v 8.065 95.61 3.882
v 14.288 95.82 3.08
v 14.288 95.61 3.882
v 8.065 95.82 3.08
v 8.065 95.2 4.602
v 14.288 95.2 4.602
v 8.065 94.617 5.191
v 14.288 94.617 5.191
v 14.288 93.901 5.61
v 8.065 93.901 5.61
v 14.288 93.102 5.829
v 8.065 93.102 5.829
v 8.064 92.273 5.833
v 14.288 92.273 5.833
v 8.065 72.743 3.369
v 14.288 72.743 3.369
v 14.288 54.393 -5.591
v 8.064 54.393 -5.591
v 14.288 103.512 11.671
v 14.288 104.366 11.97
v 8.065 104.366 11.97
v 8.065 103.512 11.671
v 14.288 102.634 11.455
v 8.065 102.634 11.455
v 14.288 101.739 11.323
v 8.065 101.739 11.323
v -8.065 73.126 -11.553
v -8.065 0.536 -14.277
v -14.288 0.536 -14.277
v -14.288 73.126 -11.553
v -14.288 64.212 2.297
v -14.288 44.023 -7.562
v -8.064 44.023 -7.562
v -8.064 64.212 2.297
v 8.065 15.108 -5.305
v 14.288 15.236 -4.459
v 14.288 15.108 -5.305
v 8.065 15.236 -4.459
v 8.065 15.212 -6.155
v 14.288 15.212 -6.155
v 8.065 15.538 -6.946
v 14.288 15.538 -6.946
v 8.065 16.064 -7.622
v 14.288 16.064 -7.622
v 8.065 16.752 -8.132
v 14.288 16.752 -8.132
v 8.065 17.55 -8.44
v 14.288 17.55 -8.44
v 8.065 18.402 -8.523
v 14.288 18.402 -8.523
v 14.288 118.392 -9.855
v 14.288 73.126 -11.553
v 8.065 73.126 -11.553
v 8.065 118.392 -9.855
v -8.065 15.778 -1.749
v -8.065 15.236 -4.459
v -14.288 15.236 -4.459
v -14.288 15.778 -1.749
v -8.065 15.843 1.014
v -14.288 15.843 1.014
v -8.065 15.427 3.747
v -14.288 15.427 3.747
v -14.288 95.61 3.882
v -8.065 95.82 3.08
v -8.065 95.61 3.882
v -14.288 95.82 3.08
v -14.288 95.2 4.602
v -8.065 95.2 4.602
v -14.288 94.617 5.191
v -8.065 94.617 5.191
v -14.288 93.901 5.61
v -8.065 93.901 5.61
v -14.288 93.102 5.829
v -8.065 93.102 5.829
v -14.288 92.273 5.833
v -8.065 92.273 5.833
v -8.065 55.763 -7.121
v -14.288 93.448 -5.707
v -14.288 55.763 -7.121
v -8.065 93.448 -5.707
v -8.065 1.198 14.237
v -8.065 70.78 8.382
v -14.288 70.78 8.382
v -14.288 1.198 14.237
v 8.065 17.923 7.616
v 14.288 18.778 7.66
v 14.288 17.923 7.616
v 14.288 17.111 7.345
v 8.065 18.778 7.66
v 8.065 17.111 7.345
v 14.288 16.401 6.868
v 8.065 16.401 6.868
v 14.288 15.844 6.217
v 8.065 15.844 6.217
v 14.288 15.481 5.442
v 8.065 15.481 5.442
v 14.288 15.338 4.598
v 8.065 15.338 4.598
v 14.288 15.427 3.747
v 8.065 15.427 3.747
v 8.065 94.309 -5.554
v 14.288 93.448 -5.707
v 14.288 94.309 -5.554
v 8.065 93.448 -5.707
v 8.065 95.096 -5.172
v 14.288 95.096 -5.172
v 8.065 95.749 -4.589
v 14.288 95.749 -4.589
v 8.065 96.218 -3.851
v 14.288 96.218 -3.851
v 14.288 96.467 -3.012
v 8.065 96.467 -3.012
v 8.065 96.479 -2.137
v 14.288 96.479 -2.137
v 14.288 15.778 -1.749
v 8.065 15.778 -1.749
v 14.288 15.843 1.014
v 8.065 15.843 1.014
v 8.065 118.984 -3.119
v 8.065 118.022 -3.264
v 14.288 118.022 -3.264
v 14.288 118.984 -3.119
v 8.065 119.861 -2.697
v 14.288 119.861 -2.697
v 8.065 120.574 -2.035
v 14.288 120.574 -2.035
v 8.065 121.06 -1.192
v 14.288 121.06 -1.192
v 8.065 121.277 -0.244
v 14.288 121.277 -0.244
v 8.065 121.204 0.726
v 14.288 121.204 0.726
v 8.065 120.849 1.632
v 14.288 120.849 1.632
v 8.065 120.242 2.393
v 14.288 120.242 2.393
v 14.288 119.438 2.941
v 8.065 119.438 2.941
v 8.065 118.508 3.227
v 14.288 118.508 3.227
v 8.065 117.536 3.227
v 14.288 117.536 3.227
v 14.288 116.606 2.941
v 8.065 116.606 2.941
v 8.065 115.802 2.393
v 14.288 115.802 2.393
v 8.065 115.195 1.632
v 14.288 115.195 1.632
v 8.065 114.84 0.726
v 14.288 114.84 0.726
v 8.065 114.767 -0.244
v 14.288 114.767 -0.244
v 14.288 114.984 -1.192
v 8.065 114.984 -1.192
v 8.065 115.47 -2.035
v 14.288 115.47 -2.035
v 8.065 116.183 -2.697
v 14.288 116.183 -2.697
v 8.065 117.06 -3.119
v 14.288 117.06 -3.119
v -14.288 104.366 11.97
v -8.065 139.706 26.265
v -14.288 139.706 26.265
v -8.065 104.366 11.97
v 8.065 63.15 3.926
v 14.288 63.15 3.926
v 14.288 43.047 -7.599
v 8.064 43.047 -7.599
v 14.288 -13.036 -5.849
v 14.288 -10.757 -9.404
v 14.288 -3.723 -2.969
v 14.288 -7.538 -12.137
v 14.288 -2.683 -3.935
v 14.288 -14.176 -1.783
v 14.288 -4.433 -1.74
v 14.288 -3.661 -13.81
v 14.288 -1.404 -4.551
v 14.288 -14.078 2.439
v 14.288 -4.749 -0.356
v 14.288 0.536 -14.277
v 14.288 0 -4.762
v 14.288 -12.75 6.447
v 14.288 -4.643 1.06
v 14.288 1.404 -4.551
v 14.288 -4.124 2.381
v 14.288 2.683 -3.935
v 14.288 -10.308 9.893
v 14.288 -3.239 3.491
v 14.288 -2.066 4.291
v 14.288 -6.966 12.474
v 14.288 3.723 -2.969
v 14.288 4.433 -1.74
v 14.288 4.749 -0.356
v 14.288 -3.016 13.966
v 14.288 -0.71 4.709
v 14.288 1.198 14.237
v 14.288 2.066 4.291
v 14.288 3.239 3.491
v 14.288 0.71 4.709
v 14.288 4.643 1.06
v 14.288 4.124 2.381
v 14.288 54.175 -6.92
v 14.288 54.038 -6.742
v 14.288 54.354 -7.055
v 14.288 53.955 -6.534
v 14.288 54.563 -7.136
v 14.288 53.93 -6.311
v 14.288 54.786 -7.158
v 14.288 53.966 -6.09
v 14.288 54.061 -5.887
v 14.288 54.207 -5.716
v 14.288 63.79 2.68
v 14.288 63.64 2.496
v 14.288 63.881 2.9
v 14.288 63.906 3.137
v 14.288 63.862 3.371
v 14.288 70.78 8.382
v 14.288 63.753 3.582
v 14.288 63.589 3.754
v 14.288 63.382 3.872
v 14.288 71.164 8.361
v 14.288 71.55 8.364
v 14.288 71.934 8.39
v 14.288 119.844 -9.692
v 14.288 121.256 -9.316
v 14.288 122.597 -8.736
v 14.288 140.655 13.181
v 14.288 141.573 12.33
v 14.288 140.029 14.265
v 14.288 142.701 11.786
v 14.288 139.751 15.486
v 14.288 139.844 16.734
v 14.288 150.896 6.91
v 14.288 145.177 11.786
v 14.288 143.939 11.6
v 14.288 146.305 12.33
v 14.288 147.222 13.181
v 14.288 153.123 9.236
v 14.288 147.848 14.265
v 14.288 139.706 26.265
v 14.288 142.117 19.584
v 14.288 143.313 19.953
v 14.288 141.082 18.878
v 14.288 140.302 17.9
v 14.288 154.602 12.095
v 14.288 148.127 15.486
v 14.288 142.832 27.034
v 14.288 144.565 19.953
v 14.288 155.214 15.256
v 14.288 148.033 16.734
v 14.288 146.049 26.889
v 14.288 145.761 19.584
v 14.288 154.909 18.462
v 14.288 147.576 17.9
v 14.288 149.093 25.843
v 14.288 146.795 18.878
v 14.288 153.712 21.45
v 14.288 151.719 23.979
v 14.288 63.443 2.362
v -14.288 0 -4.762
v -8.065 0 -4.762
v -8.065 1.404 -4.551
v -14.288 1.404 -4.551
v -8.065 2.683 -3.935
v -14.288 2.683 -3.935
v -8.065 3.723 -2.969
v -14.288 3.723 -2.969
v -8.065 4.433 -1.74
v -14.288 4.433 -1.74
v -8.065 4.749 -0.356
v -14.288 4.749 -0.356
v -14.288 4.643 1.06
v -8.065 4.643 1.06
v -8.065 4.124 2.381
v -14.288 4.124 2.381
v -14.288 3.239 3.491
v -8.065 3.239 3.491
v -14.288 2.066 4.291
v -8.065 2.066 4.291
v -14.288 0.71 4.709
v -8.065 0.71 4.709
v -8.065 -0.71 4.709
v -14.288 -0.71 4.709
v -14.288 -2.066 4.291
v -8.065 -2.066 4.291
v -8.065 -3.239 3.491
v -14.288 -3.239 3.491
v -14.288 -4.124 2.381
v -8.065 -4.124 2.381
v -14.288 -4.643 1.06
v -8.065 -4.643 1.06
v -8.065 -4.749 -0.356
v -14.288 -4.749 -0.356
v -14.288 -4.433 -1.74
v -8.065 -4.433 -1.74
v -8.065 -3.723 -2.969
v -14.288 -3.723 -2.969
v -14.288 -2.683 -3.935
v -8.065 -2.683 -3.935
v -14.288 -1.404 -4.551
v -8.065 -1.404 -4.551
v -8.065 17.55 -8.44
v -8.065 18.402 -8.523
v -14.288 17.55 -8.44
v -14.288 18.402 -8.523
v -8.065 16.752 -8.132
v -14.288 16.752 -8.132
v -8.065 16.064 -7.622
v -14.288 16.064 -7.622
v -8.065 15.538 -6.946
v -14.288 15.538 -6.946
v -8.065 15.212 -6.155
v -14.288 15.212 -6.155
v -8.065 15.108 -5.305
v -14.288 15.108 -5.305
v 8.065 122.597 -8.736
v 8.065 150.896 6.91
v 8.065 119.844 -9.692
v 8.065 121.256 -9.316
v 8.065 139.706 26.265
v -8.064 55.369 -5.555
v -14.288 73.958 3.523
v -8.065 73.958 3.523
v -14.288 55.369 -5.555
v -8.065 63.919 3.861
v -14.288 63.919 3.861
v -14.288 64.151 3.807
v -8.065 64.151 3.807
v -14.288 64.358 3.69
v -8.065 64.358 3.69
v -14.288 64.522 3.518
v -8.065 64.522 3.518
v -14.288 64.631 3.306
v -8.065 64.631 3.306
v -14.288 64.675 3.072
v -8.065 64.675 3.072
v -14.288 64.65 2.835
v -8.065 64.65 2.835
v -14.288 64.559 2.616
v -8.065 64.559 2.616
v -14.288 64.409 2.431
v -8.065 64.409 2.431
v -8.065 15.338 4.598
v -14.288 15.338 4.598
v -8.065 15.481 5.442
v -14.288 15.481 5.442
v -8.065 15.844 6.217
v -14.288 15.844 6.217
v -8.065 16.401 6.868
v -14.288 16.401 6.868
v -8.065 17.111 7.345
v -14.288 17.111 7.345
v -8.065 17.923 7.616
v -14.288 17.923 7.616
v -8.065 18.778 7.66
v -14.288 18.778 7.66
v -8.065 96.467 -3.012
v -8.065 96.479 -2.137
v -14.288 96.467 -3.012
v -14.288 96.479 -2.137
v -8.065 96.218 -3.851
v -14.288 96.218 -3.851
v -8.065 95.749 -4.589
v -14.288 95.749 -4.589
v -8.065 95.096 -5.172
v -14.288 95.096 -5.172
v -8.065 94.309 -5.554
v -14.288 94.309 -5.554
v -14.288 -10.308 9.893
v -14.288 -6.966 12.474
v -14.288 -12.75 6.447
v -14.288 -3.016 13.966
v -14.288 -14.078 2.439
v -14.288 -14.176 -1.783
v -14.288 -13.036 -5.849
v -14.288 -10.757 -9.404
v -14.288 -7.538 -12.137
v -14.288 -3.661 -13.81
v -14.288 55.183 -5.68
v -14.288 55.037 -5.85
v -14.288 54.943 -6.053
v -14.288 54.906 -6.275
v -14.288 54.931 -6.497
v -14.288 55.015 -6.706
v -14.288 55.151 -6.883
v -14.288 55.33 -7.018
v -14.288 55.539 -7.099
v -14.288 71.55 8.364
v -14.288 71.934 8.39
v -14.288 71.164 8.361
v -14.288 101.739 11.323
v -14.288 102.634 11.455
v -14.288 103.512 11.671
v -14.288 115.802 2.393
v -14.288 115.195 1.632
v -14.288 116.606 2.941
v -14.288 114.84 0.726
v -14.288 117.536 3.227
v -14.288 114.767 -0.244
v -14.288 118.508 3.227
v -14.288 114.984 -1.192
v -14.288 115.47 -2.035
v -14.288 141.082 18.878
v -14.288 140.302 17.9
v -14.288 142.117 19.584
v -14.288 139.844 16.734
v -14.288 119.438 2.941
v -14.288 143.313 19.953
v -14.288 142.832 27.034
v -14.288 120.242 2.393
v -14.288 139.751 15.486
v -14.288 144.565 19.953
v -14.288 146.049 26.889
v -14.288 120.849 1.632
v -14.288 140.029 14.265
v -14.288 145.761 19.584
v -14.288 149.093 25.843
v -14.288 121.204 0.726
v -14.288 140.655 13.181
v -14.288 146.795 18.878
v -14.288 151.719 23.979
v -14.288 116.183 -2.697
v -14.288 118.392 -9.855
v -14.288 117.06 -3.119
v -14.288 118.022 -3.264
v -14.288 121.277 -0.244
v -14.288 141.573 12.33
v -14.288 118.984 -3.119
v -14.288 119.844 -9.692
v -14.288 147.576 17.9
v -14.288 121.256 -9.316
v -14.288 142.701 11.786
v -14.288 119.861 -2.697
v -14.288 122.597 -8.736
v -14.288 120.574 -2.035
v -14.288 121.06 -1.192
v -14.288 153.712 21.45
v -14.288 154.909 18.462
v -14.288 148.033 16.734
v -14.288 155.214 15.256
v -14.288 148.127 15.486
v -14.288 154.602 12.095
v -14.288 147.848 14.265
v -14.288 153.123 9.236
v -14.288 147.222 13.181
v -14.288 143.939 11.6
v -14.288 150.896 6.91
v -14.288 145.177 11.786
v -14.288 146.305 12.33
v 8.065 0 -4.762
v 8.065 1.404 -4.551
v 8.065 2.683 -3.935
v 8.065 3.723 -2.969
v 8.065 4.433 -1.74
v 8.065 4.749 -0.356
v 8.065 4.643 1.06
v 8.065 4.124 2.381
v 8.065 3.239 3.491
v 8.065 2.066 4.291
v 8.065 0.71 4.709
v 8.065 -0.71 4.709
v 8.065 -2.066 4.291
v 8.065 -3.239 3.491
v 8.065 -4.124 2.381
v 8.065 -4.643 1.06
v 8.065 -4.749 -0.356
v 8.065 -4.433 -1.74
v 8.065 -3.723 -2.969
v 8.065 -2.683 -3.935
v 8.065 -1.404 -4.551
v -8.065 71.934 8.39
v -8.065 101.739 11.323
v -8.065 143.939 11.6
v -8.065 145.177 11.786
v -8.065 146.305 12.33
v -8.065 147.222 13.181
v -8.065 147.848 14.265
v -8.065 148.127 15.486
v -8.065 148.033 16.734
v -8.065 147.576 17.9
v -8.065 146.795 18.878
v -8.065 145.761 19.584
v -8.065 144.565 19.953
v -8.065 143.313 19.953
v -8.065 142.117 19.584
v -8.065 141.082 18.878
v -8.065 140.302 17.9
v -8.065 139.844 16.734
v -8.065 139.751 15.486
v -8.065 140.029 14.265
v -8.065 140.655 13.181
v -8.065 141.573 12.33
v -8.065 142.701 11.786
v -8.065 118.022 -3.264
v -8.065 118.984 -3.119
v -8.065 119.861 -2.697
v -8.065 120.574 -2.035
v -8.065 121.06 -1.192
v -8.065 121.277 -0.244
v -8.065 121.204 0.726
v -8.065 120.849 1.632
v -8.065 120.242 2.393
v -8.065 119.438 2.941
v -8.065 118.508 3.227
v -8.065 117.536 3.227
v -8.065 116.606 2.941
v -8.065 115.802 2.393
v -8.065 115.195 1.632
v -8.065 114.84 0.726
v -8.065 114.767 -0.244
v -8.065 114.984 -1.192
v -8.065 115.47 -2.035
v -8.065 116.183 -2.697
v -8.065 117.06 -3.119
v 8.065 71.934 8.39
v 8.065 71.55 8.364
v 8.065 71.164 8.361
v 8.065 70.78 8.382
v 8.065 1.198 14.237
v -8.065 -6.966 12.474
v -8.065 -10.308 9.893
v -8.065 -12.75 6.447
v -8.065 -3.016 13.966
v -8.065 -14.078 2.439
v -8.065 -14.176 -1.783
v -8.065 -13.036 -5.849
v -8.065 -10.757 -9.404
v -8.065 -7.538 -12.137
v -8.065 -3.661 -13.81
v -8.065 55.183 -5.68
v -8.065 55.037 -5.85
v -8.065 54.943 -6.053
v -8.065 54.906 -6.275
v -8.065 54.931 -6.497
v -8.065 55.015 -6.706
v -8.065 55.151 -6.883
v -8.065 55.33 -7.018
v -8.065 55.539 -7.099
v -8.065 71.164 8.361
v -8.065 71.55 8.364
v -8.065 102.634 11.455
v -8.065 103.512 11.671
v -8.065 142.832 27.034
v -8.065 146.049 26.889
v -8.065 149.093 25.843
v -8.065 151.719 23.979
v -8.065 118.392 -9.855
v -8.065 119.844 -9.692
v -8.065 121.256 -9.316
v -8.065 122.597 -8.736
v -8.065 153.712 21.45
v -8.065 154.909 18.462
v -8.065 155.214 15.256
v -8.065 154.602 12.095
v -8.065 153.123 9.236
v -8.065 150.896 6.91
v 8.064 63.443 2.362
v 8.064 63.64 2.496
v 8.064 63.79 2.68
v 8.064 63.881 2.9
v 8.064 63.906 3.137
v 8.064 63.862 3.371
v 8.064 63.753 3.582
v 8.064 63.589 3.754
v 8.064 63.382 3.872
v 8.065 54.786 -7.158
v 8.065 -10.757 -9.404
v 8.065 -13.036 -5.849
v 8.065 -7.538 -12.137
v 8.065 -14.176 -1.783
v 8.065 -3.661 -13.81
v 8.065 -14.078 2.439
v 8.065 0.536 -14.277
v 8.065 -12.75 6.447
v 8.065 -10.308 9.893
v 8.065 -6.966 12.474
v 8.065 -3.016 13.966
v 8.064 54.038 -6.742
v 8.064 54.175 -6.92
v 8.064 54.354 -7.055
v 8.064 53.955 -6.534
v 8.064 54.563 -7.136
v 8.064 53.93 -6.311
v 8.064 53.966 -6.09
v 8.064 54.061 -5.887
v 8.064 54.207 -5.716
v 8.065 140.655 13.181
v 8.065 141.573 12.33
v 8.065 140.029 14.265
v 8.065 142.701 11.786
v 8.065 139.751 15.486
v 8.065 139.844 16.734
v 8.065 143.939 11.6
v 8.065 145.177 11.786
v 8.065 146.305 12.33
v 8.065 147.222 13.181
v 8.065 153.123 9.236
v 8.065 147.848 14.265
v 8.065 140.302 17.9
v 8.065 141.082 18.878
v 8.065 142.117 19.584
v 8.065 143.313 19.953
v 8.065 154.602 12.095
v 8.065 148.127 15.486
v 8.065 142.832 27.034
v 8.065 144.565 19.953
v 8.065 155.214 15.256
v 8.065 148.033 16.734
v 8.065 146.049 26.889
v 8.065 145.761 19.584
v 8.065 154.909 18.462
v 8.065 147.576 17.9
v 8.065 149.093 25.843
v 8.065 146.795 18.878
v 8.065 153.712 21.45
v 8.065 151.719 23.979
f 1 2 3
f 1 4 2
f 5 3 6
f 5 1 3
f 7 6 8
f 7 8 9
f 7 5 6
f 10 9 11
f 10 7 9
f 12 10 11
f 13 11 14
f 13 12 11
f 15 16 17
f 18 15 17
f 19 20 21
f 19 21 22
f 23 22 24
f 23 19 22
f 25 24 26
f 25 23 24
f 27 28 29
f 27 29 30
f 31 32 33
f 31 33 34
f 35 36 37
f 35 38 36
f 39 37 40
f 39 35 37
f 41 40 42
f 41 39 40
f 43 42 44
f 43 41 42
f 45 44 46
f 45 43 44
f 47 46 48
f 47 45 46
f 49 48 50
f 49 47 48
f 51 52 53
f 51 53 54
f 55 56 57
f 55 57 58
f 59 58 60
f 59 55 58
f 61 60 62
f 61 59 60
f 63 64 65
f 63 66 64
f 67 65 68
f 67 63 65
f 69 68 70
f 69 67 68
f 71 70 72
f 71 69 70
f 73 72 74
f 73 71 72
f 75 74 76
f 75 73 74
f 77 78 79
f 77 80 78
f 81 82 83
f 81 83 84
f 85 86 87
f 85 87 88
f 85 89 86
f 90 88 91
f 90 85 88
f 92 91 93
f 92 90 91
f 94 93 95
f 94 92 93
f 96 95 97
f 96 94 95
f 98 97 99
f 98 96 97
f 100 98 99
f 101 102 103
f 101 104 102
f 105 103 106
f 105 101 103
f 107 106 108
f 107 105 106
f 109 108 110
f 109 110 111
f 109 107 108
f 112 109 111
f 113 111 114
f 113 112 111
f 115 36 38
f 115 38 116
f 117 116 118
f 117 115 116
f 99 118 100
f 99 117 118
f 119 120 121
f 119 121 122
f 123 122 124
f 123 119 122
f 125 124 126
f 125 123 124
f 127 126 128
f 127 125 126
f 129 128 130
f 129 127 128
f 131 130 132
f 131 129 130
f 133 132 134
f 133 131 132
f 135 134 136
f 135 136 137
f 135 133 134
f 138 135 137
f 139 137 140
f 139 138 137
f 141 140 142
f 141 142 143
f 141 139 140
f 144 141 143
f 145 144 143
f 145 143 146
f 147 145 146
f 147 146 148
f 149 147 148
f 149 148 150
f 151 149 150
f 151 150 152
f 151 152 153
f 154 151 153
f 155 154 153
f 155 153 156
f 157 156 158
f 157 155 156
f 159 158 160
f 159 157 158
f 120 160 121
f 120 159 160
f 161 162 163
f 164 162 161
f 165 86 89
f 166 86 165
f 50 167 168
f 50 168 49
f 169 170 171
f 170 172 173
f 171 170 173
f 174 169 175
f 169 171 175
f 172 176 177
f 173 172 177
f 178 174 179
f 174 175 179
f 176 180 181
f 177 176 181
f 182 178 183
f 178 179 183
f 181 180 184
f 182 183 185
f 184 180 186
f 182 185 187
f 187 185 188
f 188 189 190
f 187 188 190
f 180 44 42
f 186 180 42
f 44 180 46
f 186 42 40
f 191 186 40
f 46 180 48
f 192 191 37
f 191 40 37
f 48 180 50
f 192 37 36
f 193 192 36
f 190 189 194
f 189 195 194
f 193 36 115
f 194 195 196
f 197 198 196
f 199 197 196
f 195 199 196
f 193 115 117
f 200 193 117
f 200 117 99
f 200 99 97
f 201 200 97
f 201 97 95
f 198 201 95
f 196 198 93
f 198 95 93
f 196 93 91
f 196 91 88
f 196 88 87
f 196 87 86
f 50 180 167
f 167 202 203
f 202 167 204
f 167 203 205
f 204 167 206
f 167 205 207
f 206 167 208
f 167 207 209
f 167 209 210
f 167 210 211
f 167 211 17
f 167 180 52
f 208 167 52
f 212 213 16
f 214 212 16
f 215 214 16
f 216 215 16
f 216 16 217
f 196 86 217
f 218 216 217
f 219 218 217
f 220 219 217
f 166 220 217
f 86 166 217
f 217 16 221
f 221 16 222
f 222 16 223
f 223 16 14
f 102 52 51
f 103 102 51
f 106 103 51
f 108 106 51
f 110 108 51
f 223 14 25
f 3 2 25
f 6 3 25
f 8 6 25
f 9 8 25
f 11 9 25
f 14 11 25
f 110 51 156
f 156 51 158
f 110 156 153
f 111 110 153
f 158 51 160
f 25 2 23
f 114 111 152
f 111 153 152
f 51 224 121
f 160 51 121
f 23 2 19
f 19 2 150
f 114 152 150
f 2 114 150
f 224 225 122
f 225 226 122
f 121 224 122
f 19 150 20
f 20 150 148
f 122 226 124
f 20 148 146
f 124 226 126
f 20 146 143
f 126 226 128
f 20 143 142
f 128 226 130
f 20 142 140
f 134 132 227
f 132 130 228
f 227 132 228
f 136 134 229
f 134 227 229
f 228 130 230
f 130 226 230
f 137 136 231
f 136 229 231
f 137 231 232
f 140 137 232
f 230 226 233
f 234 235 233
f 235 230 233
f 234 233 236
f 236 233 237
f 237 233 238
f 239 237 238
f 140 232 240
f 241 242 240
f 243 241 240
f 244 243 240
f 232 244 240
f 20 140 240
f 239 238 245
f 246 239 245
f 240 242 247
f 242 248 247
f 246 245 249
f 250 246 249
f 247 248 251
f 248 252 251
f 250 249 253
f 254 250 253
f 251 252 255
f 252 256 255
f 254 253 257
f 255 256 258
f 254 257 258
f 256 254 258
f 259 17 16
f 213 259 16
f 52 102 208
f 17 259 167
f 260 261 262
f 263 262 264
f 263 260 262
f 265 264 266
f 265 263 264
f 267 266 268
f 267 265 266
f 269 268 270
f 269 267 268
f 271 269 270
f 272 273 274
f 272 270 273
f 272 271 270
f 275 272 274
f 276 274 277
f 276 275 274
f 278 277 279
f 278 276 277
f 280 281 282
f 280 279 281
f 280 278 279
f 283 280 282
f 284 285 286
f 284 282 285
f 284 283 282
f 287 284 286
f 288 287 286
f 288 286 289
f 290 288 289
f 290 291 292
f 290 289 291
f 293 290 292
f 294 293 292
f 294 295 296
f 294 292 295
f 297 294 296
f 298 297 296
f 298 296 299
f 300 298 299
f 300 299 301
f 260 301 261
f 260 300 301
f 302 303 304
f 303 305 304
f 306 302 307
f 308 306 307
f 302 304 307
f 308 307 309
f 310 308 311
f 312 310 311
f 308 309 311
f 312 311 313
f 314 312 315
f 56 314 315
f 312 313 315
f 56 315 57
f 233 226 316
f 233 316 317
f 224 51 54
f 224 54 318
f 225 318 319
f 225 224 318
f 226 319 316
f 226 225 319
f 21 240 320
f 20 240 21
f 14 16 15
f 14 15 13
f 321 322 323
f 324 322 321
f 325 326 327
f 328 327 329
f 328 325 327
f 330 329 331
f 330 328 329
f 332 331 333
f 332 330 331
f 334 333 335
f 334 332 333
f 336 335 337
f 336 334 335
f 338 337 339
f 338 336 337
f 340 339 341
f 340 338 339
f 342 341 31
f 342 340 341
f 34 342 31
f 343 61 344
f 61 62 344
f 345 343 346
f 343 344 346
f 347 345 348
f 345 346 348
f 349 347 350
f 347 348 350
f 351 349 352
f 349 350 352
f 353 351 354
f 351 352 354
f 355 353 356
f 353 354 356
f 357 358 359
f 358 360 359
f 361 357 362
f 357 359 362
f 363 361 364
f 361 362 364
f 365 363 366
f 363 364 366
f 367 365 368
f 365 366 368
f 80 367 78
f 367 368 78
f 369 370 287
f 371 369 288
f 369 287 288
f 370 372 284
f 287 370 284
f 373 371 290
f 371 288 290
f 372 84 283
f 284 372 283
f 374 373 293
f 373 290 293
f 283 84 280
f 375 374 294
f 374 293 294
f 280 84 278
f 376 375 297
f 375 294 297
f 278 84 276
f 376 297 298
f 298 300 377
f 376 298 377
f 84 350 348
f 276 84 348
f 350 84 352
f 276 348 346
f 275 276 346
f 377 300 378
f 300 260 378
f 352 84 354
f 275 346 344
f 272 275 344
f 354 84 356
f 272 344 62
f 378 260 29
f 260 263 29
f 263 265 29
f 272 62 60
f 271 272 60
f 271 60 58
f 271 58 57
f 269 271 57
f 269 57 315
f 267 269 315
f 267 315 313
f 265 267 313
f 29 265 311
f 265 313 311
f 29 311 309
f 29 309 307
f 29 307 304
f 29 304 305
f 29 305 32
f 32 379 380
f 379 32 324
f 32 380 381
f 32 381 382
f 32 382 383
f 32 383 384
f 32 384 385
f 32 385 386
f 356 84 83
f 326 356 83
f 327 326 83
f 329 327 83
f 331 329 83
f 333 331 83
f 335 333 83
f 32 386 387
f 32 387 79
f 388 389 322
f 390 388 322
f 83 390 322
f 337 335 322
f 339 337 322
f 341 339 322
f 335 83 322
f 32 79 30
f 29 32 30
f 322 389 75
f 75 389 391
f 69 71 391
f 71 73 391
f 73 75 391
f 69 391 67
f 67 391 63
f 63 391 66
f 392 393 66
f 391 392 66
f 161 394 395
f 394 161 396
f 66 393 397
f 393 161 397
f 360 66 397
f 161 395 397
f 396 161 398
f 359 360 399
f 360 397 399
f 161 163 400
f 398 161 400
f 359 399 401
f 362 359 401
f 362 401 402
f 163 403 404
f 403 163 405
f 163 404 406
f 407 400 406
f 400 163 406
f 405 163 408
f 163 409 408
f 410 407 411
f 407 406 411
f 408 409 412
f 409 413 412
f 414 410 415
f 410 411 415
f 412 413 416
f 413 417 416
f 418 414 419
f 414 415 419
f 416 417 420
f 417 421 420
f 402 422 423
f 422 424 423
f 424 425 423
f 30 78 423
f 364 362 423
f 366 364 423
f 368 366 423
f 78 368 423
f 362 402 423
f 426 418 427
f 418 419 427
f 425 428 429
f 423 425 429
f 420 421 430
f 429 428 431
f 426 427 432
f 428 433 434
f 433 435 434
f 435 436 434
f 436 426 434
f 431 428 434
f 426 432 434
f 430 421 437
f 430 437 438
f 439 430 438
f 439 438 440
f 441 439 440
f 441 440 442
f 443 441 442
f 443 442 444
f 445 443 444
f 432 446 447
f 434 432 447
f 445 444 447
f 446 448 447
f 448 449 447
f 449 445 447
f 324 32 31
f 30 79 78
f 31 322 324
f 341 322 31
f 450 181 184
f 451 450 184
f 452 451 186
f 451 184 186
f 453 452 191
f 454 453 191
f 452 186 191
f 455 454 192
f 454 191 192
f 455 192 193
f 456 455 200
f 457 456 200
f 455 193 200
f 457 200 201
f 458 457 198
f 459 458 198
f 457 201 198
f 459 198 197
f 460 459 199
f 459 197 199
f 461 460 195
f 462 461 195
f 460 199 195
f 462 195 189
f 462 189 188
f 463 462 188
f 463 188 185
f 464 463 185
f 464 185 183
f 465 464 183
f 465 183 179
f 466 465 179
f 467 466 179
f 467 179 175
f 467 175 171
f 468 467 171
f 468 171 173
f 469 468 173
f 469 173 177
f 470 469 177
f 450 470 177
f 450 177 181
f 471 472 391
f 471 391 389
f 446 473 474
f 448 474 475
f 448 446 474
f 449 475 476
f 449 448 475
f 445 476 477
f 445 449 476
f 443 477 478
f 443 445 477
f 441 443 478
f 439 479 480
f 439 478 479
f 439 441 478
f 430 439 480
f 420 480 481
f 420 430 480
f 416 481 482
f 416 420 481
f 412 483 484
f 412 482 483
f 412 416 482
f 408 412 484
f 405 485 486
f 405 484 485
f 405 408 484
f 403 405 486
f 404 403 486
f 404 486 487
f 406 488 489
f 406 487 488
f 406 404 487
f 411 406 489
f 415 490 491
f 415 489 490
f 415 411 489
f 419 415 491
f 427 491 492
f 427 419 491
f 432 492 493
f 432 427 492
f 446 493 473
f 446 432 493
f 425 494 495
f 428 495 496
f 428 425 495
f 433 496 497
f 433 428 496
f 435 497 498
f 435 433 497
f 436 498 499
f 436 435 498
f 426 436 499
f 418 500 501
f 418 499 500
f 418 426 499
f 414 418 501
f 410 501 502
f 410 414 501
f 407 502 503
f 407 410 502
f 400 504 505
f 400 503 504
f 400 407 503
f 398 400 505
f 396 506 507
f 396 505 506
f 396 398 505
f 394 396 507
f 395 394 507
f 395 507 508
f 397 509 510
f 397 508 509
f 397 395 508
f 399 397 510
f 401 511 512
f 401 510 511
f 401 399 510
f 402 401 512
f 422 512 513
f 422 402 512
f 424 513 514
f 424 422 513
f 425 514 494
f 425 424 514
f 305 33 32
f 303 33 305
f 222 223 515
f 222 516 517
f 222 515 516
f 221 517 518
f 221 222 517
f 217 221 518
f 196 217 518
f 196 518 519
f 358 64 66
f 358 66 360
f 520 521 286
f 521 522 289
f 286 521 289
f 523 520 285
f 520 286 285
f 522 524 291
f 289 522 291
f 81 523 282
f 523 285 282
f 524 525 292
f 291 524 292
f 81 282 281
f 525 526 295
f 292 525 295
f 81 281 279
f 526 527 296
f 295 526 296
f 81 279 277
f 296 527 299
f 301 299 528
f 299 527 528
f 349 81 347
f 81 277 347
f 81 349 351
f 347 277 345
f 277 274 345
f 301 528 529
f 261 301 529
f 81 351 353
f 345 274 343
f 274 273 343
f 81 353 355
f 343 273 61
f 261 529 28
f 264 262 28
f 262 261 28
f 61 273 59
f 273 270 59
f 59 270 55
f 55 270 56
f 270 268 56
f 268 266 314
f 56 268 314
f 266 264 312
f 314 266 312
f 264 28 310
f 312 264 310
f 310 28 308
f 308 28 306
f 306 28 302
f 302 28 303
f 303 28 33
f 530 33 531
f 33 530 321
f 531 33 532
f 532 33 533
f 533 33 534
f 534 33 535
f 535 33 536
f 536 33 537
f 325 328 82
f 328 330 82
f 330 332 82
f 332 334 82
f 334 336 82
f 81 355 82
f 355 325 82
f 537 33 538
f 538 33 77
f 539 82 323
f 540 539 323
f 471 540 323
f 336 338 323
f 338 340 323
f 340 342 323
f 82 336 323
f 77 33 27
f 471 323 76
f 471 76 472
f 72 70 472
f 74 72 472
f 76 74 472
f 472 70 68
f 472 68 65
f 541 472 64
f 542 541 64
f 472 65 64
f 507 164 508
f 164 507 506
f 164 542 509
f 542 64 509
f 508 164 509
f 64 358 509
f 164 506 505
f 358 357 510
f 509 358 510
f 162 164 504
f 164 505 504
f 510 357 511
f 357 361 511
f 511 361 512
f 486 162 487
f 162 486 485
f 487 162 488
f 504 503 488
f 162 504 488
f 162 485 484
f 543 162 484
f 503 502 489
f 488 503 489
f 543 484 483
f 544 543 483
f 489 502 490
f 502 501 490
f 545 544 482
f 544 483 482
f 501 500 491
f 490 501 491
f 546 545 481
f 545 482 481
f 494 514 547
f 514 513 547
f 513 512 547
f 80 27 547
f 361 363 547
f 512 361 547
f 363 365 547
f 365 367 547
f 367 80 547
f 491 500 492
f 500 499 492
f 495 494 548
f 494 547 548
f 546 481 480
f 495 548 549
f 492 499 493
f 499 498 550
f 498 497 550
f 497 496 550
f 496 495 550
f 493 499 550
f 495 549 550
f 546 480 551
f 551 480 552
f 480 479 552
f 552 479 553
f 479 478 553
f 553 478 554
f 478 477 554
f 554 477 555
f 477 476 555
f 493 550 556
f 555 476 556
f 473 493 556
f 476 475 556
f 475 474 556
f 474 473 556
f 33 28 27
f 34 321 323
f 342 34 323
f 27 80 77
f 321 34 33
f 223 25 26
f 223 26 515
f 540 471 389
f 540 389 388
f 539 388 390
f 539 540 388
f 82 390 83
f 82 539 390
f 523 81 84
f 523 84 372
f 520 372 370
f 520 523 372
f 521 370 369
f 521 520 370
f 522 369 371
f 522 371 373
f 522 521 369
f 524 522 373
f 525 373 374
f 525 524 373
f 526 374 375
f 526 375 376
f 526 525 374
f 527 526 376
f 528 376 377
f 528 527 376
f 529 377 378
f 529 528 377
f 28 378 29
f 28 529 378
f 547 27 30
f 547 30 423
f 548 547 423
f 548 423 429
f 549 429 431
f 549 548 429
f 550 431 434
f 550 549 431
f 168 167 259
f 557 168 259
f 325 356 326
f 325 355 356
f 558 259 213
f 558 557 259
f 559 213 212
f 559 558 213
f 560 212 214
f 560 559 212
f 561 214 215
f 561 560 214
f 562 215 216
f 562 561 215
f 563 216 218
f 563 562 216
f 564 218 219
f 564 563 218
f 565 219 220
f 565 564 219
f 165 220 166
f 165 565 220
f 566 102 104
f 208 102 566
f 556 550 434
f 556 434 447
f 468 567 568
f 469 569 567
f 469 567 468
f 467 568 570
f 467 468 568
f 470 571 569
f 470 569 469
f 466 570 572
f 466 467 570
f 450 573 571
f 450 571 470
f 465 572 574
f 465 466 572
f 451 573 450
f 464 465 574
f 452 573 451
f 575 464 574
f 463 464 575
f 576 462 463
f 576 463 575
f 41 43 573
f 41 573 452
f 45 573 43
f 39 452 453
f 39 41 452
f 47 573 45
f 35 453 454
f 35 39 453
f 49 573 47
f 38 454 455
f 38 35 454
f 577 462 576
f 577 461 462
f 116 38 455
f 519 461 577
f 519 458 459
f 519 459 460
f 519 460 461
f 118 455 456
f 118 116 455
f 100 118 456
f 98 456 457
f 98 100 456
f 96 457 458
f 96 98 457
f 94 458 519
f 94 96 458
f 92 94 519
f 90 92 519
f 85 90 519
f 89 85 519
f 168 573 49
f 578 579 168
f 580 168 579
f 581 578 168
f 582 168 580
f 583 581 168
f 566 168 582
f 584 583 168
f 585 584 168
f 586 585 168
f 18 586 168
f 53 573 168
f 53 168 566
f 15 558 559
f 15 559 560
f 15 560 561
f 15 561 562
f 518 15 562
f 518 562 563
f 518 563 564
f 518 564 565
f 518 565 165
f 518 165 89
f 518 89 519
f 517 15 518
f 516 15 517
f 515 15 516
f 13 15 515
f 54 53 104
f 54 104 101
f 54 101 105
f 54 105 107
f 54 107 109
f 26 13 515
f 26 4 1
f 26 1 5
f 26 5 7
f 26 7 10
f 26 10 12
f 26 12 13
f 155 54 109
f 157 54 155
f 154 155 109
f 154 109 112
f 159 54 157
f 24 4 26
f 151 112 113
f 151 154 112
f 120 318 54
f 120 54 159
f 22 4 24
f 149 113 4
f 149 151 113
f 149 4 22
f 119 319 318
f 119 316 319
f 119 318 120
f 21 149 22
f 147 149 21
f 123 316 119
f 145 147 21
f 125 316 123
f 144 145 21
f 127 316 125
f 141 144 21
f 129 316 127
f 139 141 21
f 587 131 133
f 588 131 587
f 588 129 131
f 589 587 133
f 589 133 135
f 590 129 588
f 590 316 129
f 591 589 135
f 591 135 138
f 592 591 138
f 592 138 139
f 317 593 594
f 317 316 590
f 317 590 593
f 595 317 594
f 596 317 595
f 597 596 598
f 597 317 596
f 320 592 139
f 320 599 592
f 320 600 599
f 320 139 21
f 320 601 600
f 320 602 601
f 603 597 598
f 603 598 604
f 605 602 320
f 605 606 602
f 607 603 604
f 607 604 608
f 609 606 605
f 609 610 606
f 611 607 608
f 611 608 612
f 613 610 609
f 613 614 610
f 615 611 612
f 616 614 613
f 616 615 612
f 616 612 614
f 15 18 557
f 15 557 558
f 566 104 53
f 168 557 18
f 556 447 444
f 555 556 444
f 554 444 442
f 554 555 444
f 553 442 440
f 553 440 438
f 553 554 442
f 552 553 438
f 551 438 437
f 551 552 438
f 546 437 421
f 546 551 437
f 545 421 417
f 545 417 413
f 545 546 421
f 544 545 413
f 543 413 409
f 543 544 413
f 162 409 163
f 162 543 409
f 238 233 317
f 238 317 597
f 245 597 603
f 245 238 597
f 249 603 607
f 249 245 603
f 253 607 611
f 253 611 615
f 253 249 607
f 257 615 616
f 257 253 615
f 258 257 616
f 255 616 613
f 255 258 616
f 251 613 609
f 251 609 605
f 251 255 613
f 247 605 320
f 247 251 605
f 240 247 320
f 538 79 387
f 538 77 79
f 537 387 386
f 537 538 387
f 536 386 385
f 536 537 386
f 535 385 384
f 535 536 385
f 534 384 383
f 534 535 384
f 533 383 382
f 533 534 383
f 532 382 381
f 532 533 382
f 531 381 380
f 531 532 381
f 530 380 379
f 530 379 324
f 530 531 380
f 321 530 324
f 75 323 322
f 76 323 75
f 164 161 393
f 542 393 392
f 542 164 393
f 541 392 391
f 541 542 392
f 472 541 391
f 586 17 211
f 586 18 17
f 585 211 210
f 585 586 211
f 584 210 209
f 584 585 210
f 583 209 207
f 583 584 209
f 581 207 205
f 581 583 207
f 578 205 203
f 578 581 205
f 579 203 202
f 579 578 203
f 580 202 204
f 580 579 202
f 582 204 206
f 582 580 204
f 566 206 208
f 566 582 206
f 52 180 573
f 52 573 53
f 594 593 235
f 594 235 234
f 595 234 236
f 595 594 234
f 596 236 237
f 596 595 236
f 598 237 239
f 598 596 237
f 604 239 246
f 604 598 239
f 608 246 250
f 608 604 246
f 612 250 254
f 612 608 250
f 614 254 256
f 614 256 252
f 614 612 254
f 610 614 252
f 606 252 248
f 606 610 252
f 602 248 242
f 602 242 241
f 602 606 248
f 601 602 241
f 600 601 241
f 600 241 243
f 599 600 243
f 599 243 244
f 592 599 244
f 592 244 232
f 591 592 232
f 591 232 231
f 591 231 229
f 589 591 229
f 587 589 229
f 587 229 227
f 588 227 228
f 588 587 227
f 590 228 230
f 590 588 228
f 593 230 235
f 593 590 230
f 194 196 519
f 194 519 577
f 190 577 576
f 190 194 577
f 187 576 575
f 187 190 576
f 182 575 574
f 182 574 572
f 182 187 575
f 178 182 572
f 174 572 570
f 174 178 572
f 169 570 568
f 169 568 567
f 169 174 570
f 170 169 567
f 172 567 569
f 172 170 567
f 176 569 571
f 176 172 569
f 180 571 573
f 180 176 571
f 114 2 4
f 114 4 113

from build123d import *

# Parameters (mm, degrees)
SKETCH6_R           = 3.2639
SKETCH6_R_2         = 4.19989
BOSS_EXTRUDE3_DEPTH = 14.2875
SKETCH7_R           = 4.7625
CUT_EXTRUDE1_DEPTH  = 7.14375
SKETCH8_R           = 7.9375
CUT_EXTRUDE2_DEPTH  = 5.55625
CUT_EXTRUDE3_DEPTH  = 29.21
CUT_EXTRUDE5_DEPTH  = 28.575
FILLET2_R           = 3.175
FILLET3_R           = 3.175
BOSS_EXTRUDE4_DEPTH = 6.223
FILLET4_R           = 0.8255
BOSS_EXTRUDE5_DEPTH = 6.223
FILLET6_R           = 0.8255


with BuildPart() as part:
    # Sketch6 → Boss-Extrude3 (new body, symmetric)
    with BuildSketch(Plane(origin=(0, 0, 0), x_dir=(0, 0, -1), z_dir=(1, 0, 0))):
        with BuildLine():
            Line((-8.381868112, 70.779690611), (-14.237180291, 1.198062439))
            ThreePointArc((-14.237180291, 1.198062439), (-0.331752192, -14.283647879), (14.277450567, 0.53578125))
            Line((14.277450567, 0.53578125), (11.553393182, 73.126217476))
            Line((11.553393182, 73.126217476), (9.854739755, 118.39178125))
            ThreePointArc((9.854739755, 118.39178125), (9.530289118, 120.556972634), (8.73611616, 122.597220477))
            Line((8.73611616, 122.597220477), (-6.910022509, 150.896463863))
            ThreePointArc((-6.910022509, 150.896463863), (-21.450180104, 153.711509321), (-26.264611031, 139.705727705))
            Line((-26.264611031, 139.705727705), (-11.969665934, 104.365862186))
            ThreePointArc((-11.969665934, 104.365862186), (-11.552306922, 103.075438538), (-11.323296274, 101.738675336))
            Line((-11.323296274, 101.738675336), (-8.390034626, 71.934102831))
            ThreePointArc((-8.390034626, 71.934102831), (-8.359662681, 71.357082692), (-8.381868112, 70.779690611))
        make_face()
        with Locations((0, 118.021968393)):
            Circle(SKETCH6_R, mode=Mode.SUBTRACT)
        with Locations((-15.799642553, 143.938798421)):
            Circle(SKETCH6_R_2, mode=Mode.SUBTRACT)
    extrude(amount=BOSS_EXTRUDE3_DEPTH, both=True)

    # Sketch7 → Cut-Extrude1 (cut)
    with BuildSketch(Plane(origin=(14.2875, 0, 0), x_dir=(0, 0, -1), z_dir=(1, 0, 0))):
        Circle(SKETCH7_R)
    cut_extrude1 = extrude(amount=-CUT_EXTRUDE1_DEPTH, mode=Mode.SUBTRACT)

    # Sketch8 → Cut-Extrude2 (cut)
    with BuildSketch(Plane(origin=(7.14375, 0, 0), x_dir=(0, 0, -1), z_dir=(1, 0, 0))):
        Circle(SKETCH8_R)
    cut_extrude2 = extrude(amount=-CUT_EXTRUDE2_DEPTH, mode=Mode.SUBTRACT)

    # Mirror1: Cut-Extrude2 across plane
    add(cut_extrude2.mirror(Plane(origin=(0, 0, 0), x_dir=(0, 0, 1), z_dir=(1, 0, 0))), mode=Mode.SUBTRACT)

    # Mirror2: Cut-Extrude1 across plane
    add(cut_extrude1.mirror(Plane(origin=(0, 0, 0), x_dir=(0, 0, 1), z_dir=(1, 0, 0))), mode=Mode.SUBTRACT)

    # Sketch10 → Cut-Extrude3 (cut, symmetric)
    with BuildSketch(Plane(origin=(0, 0, 14.237180291), x_dir=(-1, 0, 0), z_dir=(0, 0, -1))):
        with BuildLine():
            Line((-8.0645, 155.976463863), (-8.0645, -18.648536137))
            ThreePointArc((-8.0645, -18.648536137), (-7.13456403, -20.893600167), (-4.8895, -21.823536137))
            Line((-4.8895, -21.823536137), (4.8895, -21.823536137))
            ThreePointArc((4.8895, -21.823536137), (7.13456403, -20.893600167), (8.0645, -18.648536137))
            Line((8.0645, -18.648536137), (8.0645, 155.976463863))
            Line((8.0645, 155.976463863), (-8.0645, 155.976463863))
        make_face()
    extrude(amount=CUT_EXTRUDE3_DEPTH, both=True, mode=Mode.SUBTRACT)

    # Sketch13 → Cut-Extrude5 (cut)
    with BuildSketch(Plane(origin=(14.2875, 0, 0), x_dir=(0, 0, -1), z_dir=(1, 0, 0))):
        with BuildLine():
            Line((-3.369379853, 72.742718267), (-6.230490775, 95.422966156))
            Line((-6.230490775, 95.422966156), (5.577203891, 96.912505615))
            Line((5.577203891, 96.912505615), (8.716072329, 13.26822174))
            ThreePointArc((8.716072329, 13.26822174), (0.368613547, 15.870719866), (-8.090670188, 13.658575362))
            Line((-8.090670188, 13.658575362), (-3.319759564, 70.353712855))
            ThreePointArc((-3.319759564, 70.353712855), (-3.281968474, 71.549515806), (-3.369379853, 72.742718267))
        make_face()
    extrude(amount=-CUT_EXTRUDE5_DEPTH, mode=Mode.SUBTRACT)

    # Fillet2
    fillet2_edges = [part.edges().sort_by_distance(p)[0] for p in [
        (-11.176, 95.422966156, 6.230490775),
        (-11.176, 96.912505615, -5.577203891),
        (-11.176, 13.26822174, -8.716072329),
        (-11.176, 13.658575362, 8.090670188),
    ]]
    fillet(fillet2_edges, radius=FILLET2_R)

    # Fillet3
    fillet3_edges = [part.edges().sort_by_distance(p)[0] for p in [
        (11.176, 95.422966156, 6.230490775),
        (11.176, 96.912505615, -5.577203891),
        (11.176, 13.26822174, -8.716072329),
        (11.176, 13.658575362, 8.090670188),
    ]]
    fillet(fillet3_edges, radius=FILLET3_R)

    # Sketch21 → Boss-Extrude4 (add)
    with BuildSketch(Plane(origin=(14.2875, 0, 0), x_dir=(0, 0, -1), z_dir=(1, 0, 0))):
        with BuildLine():
            Line((-3.369379853, 72.742718267), (7.304454361, 50.884890412))
            Line((7.304454361, 50.884890412), (7.59858159, 43.047014467))
            Line((7.59858159, 43.047014467), (-3.674943248, 66.132885981))
            Line((-3.674943248, 66.132885981), (-3.319759564, 70.353712855))
            ThreePointArc((-3.319759564, 70.353712855), (-3.281968474, 71.549515806), (-3.369379853, 72.742718267))
        make_face()
    extrude(amount=-BOSS_EXTRUDE4_DEPTH)

    # Fillet4
    fillet4_edges = [part.edges().sort_by_distance(p)[0] for p in [
        (11.176, 66.132885981, 3.674943248),
        (11.176, 50.884890412, -7.304454361),
    ]]
    fillet(fillet4_edges, radius=FILLET4_R)

    # Sketch23 → Boss-Extrude5 (add)
    with BuildSketch(Plane(origin=(-14.2875, 0, -12.7), x_dir=(0, 0, -1), z_dir=(1, 0, 0))):
        with BuildLine():
            Line((-16.361406478, 74.242085268), (-5.432185966, 51.861278542))
            Line((-5.432185966, 51.861278542), (-5.138058737, 44.023402597))
            Line((-5.138058737, 44.023402597), (-16.310243165, 66.901749696))
            Line((-16.310243165, 66.901749696), (-16.019759564, 70.353712855))
            ThreePointArc((-16.019759564, 70.353712855), (-16.023369976, 72.312591024), (-16.361406478, 74.242085268))
        make_face()
    extrude(amount=BOSS_EXTRUDE5_DEPTH)

    # Fillet6
    fillet6_edges = [part.edges().sort_by_distance(p)[0] for p in [
        (-11.176, 66.901749696, 3.610243165),
        (-11.176, 51.861278542, -7.267814034),
    ]]
    fillet(fillet6_edges, radius=FILLET6_R)


solid = part.part
